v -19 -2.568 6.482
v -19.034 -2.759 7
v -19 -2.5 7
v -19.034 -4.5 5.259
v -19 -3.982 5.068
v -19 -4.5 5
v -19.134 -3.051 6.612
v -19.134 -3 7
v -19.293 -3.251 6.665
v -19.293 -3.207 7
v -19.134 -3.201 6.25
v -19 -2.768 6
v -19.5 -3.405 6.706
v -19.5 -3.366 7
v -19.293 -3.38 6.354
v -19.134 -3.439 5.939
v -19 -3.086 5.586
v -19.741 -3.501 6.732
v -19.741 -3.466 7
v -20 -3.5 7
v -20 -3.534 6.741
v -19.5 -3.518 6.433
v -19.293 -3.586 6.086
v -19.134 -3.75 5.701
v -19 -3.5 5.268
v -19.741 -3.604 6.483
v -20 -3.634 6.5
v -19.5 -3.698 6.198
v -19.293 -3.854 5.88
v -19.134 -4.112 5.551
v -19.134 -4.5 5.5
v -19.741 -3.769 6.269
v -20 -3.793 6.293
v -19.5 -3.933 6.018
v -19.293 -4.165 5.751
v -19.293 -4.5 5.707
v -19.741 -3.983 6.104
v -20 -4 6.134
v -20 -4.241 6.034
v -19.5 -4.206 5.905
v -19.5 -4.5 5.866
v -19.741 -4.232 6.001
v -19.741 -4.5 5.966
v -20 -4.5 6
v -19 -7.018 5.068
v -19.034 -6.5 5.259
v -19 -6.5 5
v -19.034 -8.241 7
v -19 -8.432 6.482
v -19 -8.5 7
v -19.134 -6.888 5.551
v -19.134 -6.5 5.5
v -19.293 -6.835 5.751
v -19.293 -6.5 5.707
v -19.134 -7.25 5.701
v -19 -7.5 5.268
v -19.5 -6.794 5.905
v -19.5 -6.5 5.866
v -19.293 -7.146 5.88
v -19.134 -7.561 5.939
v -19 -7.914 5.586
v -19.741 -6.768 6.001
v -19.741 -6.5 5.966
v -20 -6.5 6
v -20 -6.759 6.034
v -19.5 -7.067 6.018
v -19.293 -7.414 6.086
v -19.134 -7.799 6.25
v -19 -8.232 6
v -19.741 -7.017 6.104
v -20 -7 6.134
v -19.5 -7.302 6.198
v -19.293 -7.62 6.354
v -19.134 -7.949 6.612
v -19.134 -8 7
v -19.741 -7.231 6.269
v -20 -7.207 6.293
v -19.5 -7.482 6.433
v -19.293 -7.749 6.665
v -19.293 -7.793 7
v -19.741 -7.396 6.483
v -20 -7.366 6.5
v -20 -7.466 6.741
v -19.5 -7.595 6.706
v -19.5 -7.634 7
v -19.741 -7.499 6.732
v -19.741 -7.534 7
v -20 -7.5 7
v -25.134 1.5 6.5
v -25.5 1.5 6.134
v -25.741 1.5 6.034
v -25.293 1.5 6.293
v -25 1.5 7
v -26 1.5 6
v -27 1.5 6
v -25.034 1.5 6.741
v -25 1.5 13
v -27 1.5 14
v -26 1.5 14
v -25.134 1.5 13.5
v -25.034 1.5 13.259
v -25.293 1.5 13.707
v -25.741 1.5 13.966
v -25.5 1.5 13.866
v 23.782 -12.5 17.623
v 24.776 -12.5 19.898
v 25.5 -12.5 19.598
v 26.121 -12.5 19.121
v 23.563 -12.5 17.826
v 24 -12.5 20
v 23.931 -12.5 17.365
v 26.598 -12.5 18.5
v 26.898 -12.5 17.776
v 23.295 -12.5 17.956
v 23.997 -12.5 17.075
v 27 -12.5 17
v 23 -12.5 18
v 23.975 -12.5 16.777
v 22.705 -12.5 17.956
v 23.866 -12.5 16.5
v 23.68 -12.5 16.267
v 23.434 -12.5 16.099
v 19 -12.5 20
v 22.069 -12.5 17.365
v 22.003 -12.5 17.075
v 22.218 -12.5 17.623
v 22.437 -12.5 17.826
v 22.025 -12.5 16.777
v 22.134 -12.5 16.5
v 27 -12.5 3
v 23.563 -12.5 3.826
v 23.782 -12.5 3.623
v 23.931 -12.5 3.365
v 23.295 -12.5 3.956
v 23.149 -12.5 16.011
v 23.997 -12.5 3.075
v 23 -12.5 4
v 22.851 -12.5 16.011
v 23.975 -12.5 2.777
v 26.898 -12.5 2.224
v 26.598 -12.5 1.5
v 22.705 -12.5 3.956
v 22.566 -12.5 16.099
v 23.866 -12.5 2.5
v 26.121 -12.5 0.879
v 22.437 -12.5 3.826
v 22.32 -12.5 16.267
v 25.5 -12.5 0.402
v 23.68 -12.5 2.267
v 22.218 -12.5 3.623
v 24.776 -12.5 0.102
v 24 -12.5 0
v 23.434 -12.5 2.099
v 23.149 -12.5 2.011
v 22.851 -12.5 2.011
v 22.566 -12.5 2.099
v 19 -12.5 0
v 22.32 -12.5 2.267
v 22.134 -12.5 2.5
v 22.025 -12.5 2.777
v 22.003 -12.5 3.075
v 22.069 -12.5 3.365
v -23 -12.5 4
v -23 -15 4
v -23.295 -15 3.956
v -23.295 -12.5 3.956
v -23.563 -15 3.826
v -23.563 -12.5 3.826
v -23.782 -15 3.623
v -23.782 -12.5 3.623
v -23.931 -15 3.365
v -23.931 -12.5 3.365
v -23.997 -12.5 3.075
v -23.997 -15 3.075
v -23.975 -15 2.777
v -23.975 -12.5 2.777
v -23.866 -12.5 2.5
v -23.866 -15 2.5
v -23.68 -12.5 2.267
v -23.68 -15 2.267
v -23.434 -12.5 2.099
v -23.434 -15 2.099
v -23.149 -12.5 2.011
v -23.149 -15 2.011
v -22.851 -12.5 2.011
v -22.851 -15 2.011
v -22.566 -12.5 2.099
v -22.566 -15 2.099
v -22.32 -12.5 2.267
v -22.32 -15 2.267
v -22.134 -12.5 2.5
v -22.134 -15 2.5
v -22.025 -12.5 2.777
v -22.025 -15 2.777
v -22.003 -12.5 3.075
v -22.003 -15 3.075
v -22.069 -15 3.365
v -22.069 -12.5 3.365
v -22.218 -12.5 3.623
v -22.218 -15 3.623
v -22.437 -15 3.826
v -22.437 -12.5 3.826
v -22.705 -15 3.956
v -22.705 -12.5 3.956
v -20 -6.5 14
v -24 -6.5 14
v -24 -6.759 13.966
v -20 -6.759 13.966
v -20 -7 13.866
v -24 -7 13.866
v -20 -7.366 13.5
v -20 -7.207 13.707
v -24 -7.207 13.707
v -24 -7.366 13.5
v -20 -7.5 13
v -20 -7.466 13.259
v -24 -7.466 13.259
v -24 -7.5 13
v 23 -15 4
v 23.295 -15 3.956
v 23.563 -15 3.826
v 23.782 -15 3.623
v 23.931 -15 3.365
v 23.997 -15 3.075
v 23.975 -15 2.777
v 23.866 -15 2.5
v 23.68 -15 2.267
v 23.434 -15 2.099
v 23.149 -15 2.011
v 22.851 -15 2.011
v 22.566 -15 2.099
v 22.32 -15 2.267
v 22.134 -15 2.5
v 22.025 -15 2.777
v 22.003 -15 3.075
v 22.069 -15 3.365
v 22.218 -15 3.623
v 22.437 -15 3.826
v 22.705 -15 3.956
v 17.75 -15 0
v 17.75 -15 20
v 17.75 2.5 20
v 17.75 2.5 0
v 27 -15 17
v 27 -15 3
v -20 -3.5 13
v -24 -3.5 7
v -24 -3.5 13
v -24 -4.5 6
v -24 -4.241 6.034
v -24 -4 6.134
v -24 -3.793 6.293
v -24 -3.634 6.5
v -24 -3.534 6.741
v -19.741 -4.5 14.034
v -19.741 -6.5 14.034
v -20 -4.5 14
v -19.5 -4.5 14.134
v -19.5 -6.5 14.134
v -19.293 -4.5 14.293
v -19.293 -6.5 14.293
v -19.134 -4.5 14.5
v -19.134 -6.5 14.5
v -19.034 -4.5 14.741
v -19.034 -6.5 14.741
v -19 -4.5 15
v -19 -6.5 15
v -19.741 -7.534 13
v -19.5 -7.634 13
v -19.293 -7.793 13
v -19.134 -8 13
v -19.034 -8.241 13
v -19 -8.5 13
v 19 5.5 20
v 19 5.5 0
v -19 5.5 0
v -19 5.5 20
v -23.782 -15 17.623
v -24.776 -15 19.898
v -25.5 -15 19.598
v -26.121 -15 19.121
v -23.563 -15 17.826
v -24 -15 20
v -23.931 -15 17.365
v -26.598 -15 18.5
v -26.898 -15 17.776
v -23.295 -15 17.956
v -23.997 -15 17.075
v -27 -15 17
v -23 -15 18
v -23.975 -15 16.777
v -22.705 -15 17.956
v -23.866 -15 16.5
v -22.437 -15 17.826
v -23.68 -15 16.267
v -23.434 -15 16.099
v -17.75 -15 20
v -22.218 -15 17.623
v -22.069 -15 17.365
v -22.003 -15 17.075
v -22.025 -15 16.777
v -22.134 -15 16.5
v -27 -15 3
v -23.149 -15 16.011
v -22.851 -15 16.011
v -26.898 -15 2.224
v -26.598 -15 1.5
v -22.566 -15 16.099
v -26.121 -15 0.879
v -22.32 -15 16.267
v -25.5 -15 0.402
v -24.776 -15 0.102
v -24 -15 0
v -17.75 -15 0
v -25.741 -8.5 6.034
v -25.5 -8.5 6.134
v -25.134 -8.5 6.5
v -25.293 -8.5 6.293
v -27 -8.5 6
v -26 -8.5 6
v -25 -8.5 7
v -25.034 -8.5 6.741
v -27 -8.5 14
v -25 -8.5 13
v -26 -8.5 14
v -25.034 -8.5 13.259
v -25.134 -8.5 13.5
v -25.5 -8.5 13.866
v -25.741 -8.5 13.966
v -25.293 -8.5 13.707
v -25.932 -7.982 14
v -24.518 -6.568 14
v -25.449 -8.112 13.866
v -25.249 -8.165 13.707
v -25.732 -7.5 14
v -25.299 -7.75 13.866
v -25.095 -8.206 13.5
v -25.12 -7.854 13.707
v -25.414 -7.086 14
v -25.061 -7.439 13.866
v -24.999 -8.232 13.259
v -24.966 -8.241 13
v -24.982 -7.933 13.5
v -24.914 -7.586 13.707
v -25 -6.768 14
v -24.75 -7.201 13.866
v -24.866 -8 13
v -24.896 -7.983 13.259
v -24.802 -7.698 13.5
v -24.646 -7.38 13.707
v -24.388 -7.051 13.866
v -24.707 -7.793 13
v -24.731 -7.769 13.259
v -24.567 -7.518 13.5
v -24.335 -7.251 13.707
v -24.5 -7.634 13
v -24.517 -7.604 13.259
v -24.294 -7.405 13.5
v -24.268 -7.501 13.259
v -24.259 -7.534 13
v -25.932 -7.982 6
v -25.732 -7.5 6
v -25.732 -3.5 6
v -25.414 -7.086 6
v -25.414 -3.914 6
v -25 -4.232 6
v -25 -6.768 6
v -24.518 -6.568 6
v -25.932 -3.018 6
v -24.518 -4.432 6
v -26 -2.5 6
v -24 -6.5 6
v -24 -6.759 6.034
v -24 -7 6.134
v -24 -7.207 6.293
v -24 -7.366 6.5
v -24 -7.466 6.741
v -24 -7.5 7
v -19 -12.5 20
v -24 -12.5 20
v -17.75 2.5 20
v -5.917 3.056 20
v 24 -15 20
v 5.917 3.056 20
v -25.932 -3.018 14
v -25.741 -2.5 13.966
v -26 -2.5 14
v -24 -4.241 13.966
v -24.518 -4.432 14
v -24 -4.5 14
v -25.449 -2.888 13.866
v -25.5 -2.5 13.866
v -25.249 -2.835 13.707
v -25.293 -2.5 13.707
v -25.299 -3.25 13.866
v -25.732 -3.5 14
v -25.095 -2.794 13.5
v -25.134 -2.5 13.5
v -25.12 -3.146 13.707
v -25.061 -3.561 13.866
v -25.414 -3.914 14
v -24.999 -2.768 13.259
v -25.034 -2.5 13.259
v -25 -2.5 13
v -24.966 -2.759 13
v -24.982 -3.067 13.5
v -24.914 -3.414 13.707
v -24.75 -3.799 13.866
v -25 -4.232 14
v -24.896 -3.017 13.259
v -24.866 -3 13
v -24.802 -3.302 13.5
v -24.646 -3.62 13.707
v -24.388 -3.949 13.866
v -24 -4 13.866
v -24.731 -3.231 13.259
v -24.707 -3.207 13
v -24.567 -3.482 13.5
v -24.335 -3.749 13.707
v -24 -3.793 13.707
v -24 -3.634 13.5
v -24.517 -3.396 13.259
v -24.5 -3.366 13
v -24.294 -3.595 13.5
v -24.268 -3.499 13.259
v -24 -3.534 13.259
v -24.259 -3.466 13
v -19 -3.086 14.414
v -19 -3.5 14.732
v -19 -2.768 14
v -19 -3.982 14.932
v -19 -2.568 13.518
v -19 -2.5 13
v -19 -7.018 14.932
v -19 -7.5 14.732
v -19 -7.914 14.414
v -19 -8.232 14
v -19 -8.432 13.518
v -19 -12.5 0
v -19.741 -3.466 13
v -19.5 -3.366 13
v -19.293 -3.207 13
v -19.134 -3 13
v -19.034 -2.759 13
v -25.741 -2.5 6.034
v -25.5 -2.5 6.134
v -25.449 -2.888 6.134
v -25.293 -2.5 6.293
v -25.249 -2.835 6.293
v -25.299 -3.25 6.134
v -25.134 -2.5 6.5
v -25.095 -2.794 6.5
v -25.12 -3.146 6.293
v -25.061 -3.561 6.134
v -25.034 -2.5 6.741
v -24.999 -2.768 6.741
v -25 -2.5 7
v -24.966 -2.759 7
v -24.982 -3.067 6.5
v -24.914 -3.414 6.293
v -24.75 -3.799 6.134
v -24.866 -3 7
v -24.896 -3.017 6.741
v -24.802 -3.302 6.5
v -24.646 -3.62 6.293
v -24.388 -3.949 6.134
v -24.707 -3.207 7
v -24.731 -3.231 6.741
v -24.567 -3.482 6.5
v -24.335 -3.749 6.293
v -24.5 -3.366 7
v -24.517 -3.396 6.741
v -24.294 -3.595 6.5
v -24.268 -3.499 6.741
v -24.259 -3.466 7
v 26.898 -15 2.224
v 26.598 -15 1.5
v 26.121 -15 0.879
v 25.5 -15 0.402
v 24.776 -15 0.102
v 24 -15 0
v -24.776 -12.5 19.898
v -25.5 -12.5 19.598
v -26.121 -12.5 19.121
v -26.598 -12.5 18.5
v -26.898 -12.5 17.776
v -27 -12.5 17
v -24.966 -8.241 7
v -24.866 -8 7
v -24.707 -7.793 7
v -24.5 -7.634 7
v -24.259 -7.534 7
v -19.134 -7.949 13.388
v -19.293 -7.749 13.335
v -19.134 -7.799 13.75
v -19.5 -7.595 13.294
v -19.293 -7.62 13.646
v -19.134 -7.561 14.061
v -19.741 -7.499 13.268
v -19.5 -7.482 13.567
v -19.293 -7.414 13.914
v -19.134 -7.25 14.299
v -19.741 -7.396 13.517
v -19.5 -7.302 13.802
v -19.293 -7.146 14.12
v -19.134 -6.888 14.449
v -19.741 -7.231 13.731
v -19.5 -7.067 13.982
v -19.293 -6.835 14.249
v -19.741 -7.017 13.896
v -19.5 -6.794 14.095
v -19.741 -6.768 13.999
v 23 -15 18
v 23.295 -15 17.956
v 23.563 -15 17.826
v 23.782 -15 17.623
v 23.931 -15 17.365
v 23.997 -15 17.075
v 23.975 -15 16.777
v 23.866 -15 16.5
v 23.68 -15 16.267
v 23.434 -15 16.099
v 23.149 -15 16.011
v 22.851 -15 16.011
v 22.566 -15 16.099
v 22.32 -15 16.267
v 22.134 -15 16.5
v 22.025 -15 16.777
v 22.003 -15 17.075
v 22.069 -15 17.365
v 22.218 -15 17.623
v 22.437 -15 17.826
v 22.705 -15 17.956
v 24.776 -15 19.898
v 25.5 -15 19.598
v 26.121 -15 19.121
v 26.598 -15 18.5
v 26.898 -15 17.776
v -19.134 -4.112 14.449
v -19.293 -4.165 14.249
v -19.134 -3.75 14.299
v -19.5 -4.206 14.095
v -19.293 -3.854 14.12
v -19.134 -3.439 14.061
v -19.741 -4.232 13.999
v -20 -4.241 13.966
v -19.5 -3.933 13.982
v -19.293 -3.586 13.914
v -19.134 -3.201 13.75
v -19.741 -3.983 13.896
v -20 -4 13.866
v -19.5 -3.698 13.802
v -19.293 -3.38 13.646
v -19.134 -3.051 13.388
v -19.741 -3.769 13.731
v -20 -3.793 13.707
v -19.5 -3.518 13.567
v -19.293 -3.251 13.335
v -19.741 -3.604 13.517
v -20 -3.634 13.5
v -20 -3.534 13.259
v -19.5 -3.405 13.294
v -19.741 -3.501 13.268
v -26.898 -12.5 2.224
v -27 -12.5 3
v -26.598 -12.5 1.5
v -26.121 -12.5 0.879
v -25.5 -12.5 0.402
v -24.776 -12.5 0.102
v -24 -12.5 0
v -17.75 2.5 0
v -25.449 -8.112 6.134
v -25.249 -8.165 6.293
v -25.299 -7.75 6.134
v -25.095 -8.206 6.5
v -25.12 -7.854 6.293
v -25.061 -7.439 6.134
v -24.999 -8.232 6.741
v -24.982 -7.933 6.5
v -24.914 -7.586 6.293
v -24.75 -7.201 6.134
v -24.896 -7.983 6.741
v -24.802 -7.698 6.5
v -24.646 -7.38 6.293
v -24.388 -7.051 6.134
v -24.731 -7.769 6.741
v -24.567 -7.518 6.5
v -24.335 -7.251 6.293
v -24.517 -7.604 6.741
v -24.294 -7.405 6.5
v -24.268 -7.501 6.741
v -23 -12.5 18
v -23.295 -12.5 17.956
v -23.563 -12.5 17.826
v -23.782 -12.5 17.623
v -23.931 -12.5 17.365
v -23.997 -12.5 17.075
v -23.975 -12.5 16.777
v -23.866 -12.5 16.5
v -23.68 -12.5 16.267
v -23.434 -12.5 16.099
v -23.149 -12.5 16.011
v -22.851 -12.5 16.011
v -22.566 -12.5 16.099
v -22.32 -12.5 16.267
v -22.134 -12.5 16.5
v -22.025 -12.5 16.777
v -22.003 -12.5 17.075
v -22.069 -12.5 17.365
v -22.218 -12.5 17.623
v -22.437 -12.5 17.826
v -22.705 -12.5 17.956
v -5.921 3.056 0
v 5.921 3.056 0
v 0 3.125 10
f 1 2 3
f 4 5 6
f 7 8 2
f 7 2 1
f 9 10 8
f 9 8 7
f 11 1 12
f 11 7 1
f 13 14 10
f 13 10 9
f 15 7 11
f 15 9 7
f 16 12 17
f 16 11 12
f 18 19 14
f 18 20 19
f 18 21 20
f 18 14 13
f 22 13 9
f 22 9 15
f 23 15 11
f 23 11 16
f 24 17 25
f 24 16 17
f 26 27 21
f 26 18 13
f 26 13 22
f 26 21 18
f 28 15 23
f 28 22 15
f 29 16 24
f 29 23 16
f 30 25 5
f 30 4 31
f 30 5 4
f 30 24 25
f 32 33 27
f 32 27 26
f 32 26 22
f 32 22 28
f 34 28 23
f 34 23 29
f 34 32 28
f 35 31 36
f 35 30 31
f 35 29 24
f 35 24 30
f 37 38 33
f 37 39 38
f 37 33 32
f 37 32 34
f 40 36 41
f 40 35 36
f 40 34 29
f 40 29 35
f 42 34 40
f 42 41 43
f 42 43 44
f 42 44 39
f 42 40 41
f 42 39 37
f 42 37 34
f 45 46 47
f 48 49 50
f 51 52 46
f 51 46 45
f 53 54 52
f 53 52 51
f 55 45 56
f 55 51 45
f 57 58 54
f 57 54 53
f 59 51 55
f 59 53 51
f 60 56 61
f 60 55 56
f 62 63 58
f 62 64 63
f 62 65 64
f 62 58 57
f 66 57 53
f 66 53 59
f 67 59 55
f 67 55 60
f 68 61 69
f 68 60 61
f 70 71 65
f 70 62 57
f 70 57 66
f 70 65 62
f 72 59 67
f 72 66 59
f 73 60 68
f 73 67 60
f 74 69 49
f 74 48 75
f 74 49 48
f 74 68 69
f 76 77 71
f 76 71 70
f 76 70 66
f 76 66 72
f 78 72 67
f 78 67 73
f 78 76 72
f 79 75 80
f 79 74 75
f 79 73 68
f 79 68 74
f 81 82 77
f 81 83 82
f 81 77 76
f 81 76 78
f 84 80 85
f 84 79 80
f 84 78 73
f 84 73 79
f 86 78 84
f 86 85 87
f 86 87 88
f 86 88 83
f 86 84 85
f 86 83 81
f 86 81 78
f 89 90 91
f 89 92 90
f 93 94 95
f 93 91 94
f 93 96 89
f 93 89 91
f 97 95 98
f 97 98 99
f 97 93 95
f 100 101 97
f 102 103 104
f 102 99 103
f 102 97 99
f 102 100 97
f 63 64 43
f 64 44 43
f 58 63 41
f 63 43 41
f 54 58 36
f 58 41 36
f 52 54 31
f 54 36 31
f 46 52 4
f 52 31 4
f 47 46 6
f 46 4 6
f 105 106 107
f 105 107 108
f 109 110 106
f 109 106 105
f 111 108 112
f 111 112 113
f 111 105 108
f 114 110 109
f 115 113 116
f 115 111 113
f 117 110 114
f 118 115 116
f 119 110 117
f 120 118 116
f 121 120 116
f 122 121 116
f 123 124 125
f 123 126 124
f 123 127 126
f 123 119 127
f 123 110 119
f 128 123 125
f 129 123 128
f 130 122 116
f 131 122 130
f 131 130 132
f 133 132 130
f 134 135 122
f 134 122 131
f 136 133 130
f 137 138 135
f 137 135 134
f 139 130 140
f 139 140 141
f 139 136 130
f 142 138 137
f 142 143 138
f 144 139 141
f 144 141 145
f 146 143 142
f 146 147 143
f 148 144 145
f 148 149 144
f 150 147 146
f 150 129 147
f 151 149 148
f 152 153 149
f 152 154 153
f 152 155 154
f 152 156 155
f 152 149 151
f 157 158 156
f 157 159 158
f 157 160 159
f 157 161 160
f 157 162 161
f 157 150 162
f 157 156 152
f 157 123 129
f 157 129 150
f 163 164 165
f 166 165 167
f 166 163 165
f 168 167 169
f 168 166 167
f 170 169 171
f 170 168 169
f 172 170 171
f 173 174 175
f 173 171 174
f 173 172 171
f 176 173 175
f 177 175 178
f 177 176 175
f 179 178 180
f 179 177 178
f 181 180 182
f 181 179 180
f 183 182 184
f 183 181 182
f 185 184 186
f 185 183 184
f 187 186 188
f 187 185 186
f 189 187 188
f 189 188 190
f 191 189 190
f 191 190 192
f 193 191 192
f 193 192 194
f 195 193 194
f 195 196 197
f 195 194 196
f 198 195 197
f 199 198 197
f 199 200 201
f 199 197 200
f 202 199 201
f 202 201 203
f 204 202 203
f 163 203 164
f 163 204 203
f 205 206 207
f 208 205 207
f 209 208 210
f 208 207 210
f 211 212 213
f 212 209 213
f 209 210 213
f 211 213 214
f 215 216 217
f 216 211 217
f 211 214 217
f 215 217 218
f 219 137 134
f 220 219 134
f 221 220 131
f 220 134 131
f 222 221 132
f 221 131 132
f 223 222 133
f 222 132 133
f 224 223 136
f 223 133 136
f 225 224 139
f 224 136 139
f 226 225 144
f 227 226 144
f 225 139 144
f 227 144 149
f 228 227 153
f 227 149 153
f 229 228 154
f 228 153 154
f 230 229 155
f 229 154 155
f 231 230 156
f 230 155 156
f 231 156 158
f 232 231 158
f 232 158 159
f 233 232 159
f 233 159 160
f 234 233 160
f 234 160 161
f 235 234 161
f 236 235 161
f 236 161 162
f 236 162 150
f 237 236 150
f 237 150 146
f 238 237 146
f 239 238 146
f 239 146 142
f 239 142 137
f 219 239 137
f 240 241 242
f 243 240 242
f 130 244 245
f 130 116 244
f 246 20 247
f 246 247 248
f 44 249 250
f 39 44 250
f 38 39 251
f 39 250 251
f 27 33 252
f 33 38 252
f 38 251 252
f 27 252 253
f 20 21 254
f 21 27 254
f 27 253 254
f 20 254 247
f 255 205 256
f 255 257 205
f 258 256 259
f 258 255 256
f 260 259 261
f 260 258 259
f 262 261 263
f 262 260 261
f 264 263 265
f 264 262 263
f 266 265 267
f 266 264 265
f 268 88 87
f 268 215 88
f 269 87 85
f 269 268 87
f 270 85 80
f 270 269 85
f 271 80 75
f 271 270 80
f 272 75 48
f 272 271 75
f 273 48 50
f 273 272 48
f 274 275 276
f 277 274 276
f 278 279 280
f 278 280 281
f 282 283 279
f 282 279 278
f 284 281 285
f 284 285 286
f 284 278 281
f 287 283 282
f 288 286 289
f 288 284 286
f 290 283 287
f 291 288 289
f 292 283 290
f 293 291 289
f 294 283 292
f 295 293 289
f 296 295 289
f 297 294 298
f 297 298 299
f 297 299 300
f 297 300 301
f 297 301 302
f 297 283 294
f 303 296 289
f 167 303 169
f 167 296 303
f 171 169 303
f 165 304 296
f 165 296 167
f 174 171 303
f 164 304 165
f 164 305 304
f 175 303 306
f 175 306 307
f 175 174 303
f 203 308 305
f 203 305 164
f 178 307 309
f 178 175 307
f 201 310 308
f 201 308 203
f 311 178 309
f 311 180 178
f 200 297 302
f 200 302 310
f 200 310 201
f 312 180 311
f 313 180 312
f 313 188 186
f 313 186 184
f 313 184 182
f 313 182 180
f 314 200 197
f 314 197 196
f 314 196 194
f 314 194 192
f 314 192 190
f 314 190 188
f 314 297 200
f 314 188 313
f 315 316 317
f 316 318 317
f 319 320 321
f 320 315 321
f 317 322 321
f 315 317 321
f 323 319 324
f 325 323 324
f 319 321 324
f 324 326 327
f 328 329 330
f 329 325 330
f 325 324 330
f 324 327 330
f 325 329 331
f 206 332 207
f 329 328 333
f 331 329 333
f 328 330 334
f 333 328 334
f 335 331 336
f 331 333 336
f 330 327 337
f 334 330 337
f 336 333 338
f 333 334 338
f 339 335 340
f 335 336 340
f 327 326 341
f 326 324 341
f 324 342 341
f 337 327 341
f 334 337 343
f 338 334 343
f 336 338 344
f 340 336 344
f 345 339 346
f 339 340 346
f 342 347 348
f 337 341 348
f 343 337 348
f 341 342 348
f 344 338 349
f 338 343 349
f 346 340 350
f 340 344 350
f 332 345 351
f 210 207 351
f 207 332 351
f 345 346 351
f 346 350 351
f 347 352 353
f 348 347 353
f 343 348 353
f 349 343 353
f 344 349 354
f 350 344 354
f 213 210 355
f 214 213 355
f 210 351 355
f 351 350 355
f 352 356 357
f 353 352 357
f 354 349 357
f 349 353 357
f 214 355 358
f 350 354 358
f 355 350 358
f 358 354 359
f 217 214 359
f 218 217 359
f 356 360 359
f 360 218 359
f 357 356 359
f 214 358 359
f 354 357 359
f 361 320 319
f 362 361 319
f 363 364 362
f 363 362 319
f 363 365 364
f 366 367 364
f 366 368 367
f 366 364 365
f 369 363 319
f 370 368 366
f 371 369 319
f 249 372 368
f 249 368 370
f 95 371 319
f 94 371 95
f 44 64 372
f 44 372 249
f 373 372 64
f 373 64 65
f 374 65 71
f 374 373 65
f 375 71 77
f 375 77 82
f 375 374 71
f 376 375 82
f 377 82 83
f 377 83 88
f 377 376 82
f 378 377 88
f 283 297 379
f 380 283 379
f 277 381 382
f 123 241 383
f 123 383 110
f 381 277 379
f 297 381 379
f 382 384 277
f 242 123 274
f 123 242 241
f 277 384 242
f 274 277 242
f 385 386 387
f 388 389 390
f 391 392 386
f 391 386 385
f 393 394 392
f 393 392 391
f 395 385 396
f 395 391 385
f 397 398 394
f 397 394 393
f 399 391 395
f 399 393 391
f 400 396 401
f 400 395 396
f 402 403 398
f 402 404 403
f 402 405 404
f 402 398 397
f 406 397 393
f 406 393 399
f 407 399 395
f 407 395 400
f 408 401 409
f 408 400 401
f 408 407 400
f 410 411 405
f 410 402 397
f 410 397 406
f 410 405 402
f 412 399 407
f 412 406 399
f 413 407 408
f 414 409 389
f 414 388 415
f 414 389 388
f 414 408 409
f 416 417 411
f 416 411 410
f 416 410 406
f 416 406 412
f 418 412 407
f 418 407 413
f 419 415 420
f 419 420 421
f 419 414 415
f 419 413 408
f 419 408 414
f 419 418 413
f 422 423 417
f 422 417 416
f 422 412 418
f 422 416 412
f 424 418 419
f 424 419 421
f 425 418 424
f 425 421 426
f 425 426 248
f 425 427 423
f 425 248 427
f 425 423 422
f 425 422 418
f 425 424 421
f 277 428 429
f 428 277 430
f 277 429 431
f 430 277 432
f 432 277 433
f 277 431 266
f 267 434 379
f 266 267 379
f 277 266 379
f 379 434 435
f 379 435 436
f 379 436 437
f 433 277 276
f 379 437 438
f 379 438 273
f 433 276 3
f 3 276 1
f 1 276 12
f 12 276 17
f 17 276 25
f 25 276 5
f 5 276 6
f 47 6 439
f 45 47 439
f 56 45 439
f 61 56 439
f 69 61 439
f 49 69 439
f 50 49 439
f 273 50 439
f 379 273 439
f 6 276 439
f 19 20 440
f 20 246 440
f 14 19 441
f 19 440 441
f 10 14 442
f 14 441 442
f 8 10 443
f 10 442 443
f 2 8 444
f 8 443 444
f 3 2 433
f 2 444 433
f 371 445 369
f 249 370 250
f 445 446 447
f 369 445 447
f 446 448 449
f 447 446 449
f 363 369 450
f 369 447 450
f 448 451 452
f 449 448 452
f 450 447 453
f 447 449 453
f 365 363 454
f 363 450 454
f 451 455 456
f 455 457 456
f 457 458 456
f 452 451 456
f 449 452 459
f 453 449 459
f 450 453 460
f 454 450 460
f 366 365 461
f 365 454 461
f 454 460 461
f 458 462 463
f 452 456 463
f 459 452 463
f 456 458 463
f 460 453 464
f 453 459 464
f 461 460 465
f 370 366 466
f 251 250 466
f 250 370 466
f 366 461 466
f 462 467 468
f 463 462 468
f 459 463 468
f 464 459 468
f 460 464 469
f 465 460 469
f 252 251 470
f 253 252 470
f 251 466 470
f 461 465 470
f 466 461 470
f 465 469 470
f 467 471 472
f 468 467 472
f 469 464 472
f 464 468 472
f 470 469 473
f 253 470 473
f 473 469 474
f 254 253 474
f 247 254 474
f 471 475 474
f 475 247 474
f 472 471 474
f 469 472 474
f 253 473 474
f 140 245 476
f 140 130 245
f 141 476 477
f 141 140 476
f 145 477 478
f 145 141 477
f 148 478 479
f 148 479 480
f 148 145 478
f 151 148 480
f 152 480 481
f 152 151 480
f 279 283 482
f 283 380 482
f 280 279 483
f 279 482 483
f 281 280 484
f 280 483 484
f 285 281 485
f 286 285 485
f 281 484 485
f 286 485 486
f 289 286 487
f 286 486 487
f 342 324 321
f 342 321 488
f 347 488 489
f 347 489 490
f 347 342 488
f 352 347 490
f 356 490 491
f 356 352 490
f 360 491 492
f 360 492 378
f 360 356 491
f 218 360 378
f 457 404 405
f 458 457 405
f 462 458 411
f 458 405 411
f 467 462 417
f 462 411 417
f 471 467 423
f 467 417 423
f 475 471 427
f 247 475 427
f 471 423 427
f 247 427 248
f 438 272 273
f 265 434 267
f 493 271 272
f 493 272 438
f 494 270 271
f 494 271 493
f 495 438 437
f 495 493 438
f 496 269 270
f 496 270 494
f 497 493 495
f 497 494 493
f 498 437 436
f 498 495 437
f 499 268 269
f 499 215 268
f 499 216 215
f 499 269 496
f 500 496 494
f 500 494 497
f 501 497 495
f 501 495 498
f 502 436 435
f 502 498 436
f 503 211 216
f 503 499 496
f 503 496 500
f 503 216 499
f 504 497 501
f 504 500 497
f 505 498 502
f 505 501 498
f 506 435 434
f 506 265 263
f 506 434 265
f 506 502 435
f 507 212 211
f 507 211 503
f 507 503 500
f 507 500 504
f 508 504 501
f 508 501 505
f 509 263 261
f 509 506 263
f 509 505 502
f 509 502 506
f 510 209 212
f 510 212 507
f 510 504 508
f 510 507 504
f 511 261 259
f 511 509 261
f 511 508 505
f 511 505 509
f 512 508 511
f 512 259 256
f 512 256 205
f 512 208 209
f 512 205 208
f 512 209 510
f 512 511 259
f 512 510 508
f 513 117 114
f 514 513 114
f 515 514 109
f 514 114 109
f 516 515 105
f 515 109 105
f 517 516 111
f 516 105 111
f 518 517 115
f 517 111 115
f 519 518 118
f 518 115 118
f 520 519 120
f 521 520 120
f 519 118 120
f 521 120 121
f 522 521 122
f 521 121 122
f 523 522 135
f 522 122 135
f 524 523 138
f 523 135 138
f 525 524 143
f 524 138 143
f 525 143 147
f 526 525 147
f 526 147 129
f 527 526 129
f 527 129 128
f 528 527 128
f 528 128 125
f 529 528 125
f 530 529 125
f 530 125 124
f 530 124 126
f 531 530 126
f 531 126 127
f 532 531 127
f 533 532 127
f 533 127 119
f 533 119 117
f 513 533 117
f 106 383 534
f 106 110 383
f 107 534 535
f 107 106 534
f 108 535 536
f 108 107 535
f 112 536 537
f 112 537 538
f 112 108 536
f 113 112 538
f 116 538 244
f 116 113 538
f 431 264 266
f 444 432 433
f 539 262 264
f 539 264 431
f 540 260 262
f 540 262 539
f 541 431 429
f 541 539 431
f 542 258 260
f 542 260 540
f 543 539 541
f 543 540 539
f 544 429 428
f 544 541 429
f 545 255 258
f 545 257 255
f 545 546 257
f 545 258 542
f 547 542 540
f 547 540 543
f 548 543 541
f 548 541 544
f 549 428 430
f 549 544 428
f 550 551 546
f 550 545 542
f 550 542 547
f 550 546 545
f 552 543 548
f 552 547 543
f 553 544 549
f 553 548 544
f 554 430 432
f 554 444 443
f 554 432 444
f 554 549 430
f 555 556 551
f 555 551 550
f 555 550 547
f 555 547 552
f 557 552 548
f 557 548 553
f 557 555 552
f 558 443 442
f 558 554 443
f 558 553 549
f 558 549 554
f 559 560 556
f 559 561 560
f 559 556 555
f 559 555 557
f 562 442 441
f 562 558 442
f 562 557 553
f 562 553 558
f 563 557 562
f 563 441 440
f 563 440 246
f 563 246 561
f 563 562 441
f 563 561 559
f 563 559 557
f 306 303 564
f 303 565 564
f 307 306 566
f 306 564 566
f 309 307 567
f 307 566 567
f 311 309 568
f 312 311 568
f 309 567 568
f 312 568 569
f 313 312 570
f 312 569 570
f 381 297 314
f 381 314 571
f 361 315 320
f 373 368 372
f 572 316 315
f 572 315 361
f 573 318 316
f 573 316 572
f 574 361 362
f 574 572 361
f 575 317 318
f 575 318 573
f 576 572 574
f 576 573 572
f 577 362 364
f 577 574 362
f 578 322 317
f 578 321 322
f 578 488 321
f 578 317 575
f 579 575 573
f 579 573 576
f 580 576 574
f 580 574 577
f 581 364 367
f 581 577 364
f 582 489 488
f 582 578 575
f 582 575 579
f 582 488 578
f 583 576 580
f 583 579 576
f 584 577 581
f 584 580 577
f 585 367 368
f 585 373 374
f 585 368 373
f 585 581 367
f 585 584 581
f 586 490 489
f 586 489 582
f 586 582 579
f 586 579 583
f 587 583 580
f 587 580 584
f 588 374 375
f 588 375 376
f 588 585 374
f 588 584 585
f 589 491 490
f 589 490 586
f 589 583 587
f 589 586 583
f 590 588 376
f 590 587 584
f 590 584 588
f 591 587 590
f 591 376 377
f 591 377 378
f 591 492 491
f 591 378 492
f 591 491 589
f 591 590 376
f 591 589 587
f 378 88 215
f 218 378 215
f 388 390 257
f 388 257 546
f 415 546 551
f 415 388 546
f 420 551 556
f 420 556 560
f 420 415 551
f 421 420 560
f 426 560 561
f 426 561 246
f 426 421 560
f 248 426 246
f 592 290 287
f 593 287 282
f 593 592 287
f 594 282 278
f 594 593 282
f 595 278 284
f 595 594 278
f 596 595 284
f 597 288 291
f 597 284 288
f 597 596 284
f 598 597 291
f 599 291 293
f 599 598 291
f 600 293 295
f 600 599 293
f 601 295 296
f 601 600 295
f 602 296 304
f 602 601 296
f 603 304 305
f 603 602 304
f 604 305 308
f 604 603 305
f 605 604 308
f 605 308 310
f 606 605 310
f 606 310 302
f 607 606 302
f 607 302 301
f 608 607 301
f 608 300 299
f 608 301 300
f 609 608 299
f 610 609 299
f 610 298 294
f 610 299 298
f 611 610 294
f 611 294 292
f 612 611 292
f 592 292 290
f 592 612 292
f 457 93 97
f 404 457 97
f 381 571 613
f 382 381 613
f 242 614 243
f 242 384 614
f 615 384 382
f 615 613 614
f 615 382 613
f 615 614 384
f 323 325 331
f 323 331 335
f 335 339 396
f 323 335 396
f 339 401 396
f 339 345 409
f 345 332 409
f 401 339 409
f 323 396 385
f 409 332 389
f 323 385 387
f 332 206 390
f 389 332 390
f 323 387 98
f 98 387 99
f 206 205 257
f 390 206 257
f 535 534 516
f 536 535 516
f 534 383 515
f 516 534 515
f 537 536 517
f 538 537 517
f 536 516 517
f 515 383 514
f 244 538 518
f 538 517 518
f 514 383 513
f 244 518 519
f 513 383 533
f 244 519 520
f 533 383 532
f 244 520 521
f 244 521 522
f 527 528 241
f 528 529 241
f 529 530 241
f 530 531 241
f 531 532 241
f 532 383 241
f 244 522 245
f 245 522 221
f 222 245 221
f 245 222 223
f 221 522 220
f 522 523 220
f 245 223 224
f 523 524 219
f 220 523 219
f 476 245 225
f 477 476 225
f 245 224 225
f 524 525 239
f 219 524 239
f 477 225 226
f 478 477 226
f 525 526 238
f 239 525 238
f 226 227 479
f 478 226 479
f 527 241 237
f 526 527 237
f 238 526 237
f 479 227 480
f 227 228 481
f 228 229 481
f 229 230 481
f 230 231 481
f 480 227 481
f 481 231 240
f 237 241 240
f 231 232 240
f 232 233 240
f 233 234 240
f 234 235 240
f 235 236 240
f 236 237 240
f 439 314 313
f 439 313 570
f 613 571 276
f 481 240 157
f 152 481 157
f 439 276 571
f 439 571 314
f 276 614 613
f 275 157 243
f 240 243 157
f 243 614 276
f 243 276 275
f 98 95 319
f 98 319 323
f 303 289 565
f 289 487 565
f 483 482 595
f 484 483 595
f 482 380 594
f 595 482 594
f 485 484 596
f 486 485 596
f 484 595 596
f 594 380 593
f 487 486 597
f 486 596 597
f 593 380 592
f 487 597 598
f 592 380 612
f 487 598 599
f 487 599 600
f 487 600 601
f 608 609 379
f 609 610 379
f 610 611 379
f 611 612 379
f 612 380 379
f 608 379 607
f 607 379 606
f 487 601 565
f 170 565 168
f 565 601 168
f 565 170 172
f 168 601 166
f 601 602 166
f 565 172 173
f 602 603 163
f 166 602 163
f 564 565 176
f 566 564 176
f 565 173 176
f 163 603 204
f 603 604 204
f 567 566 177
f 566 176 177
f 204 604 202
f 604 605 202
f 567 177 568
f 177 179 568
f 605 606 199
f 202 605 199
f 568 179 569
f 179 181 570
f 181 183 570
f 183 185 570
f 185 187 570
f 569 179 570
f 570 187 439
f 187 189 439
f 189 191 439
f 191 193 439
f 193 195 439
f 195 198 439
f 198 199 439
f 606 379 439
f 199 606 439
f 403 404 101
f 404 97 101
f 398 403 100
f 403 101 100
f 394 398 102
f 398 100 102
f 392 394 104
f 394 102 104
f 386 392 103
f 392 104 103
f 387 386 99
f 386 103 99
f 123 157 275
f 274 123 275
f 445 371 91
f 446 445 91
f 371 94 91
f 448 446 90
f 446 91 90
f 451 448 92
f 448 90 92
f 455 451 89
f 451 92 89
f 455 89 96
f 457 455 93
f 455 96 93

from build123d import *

# Parameters (mm, degrees)
BOSS_EXTRUDE1_DEPTH      = 20
SKETCH2_W                = 20
SKETCH2_H                = 2.5
BOSS_EXTRUDE2_DEPTH      = 8
SKETCH9_R                = 1
CORTE_EXTRUS_O1_DEPTH    = 39.118237105
FILETE1_R                = 3
ESBO_O8_W                = 0.75
ESBO_O8_H                = 17.5
CORTE_EXTRUS_O8_DEPTH    = 37.796738986
CORTE_EXTRUS_O9_DEPTH    = 37.796738986
FILETE1_OF_ESPELHAR1_R   = 3
ESBO_O14_W               = 8
ESBO_O14_H               = 4
RESSALTO_EXTRUS_O2_DEPTH = 6
ESBO_O15_W               = 8
ESBO_O15_H               = 10
RESSALTO_EXTRUS_O3_DEPTH = 2
FILETE3_R                = 1


with BuildPart() as part:
    # Sketch1 → Boss-Extrude1 (new body)
    with BuildSketch(Plane.XY):
        Polygon((17, -15), (19, -15), (19, 5.5), (-19, 5.5), (-19, -15), (-17, -15), (-17, 2.5), (17, 2.5), align=None)
    extrude(amount=BOSS_EXTRUDE1_DEPTH)

    # Sketch2 → Boss-Extrude2 (add)
    with BuildSketch(Plane(origin=(19, 0, 0), x_dir=(0, 0, -1), z_dir=(1, 0, 0))):
        with Locations((-10, -13.75)):
            Rectangle(SKETCH2_W, SKETCH2_H)
    boss_extrude2 = extrude(amount=BOSS_EXTRUDE2_DEPTH)

    # Sketch9 → Corte-extrusão1 (cut, through all)
    with BuildSketch(Plane(origin=(0, -12.5, 0), x_dir=(1, 0, 0), z_dir=(0, 1, 0))):
        with Locations(Location((23, -3, 0), (0, 0, 270))):
            Circle(SKETCH9_R)
        with Locations(Location((23, -17, 0), (0, 0, 270))):
            Circle(SKETCH9_R)
    corte_extrus_o1 = extrude(amount=-CORTE_EXTRUS_O1_DEPTH, mode=Mode.SUBTRACT)

    # Filete1
    filete1_edges = [part.edges().sort_by_distance(p)[0] for p in [
        (27, -13.75, 0),
        (27, -13.75, 20),
    ]]
    fillet(filete1_edges, radius=FILETE1_R)

    # Esboço8 → Corte-extrusão8 (cut, through all)
    with BuildSketch(Plane.XY.offset(20)):
        with Locations((17.375, -6.25)):
            Rectangle(ESBO_O8_W, ESBO_O8_H)
        with Locations((-17.375, -6.25)):
            Rectangle(ESBO_O8_W, ESBO_O8_H)
    extrude(amount=-CORTE_EXTRUS_O8_DEPTH, mode=Mode.SUBTRACT)

    # Esboço11 → Corte-extrusão9 (cut, through all)
    with BuildSketch(Plane.XY.offset(20)):
        with BuildLine():
            Line((-17.75, 2.5), (17.75, 2.5))
            add(Edge.make_bspline(
                [(-17.75, 2.5), (0, 3.750116691), (17.75, 2.5)],
                knots=[0, 0, 0, 1, 1, 1], degree=2))
        make_face()
    extrude(amount=-CORTE_EXTRUS_O9_DEPTH, mode=Mode.SUBTRACT)

    # Espelhar1: Boss-Extrude2, Corte-extrusão1 across plane
    add(boss_extrude2.mirror(Plane(origin=(0, 0, 0), x_dir=(0, 0, 1), z_dir=(1, 0, 0))))
    add(corte_extrus_o1.mirror(Plane(origin=(0, 0, 0), x_dir=(0, 0, 1), z_dir=(1, 0, 0))), mode=Mode.SUBTRACT)

    # Filete1 of Espelhar1
    filete1_of_espelhar1_edges = [part.edges().sort_by_distance(p)[0] for p in [
        (-27, -13.75, 0),
        (-27, -13.75, 20),
    ]]
    fillet(filete1_of_espelhar1_edges, radius=FILETE1_OF_ESPELHAR1_R)

    # Esboço14 → Ressalto-extrusão2 (add)
    with BuildSketch(Plane.ZY.offset(19)):
        with Locations((10, -5.5)):
            Rectangle(ESBO_O14_W, ESBO_O14_H)
    extrude(amount=RESSALTO_EXTRUS_O2_DEPTH)

    # Esboço15 → Ressalto-extrusão3 (add)
    with BuildSketch(Plane.ZY.offset(25)):
        with Locations((10, -3.5)):
            Rectangle(ESBO_O15_W, ESBO_O15_H)
    extrude(amount=RESSALTO_EXTRUS_O3_DEPTH)

    # Filete3
    filete3_edges = [part.edges().sort_by_distance(p)[0] for p in [
        (-19, -5.5, 6),
        (-22, -3.5, 6),
        (-19, -7.5, 10),
        (-22, -7.5, 6),
        (-19, -5.5, 14),
        (-22, -7.5, 14),
        (-19, -3.5, 10),
        (-22, -3.5, 14),
        (-25, -7.5, 10),
        (-25, -3.5, 10),
        (-25, -8, 14),
        (-25, -1, 14),
        (-25, -1, 6),
        (-25, -8, 6),
    ]]
    fillet(filete3_edges, radius=FILETE3_R - 0.0001)  # a hair under: the kernel refuses the full size


solid = part.part
